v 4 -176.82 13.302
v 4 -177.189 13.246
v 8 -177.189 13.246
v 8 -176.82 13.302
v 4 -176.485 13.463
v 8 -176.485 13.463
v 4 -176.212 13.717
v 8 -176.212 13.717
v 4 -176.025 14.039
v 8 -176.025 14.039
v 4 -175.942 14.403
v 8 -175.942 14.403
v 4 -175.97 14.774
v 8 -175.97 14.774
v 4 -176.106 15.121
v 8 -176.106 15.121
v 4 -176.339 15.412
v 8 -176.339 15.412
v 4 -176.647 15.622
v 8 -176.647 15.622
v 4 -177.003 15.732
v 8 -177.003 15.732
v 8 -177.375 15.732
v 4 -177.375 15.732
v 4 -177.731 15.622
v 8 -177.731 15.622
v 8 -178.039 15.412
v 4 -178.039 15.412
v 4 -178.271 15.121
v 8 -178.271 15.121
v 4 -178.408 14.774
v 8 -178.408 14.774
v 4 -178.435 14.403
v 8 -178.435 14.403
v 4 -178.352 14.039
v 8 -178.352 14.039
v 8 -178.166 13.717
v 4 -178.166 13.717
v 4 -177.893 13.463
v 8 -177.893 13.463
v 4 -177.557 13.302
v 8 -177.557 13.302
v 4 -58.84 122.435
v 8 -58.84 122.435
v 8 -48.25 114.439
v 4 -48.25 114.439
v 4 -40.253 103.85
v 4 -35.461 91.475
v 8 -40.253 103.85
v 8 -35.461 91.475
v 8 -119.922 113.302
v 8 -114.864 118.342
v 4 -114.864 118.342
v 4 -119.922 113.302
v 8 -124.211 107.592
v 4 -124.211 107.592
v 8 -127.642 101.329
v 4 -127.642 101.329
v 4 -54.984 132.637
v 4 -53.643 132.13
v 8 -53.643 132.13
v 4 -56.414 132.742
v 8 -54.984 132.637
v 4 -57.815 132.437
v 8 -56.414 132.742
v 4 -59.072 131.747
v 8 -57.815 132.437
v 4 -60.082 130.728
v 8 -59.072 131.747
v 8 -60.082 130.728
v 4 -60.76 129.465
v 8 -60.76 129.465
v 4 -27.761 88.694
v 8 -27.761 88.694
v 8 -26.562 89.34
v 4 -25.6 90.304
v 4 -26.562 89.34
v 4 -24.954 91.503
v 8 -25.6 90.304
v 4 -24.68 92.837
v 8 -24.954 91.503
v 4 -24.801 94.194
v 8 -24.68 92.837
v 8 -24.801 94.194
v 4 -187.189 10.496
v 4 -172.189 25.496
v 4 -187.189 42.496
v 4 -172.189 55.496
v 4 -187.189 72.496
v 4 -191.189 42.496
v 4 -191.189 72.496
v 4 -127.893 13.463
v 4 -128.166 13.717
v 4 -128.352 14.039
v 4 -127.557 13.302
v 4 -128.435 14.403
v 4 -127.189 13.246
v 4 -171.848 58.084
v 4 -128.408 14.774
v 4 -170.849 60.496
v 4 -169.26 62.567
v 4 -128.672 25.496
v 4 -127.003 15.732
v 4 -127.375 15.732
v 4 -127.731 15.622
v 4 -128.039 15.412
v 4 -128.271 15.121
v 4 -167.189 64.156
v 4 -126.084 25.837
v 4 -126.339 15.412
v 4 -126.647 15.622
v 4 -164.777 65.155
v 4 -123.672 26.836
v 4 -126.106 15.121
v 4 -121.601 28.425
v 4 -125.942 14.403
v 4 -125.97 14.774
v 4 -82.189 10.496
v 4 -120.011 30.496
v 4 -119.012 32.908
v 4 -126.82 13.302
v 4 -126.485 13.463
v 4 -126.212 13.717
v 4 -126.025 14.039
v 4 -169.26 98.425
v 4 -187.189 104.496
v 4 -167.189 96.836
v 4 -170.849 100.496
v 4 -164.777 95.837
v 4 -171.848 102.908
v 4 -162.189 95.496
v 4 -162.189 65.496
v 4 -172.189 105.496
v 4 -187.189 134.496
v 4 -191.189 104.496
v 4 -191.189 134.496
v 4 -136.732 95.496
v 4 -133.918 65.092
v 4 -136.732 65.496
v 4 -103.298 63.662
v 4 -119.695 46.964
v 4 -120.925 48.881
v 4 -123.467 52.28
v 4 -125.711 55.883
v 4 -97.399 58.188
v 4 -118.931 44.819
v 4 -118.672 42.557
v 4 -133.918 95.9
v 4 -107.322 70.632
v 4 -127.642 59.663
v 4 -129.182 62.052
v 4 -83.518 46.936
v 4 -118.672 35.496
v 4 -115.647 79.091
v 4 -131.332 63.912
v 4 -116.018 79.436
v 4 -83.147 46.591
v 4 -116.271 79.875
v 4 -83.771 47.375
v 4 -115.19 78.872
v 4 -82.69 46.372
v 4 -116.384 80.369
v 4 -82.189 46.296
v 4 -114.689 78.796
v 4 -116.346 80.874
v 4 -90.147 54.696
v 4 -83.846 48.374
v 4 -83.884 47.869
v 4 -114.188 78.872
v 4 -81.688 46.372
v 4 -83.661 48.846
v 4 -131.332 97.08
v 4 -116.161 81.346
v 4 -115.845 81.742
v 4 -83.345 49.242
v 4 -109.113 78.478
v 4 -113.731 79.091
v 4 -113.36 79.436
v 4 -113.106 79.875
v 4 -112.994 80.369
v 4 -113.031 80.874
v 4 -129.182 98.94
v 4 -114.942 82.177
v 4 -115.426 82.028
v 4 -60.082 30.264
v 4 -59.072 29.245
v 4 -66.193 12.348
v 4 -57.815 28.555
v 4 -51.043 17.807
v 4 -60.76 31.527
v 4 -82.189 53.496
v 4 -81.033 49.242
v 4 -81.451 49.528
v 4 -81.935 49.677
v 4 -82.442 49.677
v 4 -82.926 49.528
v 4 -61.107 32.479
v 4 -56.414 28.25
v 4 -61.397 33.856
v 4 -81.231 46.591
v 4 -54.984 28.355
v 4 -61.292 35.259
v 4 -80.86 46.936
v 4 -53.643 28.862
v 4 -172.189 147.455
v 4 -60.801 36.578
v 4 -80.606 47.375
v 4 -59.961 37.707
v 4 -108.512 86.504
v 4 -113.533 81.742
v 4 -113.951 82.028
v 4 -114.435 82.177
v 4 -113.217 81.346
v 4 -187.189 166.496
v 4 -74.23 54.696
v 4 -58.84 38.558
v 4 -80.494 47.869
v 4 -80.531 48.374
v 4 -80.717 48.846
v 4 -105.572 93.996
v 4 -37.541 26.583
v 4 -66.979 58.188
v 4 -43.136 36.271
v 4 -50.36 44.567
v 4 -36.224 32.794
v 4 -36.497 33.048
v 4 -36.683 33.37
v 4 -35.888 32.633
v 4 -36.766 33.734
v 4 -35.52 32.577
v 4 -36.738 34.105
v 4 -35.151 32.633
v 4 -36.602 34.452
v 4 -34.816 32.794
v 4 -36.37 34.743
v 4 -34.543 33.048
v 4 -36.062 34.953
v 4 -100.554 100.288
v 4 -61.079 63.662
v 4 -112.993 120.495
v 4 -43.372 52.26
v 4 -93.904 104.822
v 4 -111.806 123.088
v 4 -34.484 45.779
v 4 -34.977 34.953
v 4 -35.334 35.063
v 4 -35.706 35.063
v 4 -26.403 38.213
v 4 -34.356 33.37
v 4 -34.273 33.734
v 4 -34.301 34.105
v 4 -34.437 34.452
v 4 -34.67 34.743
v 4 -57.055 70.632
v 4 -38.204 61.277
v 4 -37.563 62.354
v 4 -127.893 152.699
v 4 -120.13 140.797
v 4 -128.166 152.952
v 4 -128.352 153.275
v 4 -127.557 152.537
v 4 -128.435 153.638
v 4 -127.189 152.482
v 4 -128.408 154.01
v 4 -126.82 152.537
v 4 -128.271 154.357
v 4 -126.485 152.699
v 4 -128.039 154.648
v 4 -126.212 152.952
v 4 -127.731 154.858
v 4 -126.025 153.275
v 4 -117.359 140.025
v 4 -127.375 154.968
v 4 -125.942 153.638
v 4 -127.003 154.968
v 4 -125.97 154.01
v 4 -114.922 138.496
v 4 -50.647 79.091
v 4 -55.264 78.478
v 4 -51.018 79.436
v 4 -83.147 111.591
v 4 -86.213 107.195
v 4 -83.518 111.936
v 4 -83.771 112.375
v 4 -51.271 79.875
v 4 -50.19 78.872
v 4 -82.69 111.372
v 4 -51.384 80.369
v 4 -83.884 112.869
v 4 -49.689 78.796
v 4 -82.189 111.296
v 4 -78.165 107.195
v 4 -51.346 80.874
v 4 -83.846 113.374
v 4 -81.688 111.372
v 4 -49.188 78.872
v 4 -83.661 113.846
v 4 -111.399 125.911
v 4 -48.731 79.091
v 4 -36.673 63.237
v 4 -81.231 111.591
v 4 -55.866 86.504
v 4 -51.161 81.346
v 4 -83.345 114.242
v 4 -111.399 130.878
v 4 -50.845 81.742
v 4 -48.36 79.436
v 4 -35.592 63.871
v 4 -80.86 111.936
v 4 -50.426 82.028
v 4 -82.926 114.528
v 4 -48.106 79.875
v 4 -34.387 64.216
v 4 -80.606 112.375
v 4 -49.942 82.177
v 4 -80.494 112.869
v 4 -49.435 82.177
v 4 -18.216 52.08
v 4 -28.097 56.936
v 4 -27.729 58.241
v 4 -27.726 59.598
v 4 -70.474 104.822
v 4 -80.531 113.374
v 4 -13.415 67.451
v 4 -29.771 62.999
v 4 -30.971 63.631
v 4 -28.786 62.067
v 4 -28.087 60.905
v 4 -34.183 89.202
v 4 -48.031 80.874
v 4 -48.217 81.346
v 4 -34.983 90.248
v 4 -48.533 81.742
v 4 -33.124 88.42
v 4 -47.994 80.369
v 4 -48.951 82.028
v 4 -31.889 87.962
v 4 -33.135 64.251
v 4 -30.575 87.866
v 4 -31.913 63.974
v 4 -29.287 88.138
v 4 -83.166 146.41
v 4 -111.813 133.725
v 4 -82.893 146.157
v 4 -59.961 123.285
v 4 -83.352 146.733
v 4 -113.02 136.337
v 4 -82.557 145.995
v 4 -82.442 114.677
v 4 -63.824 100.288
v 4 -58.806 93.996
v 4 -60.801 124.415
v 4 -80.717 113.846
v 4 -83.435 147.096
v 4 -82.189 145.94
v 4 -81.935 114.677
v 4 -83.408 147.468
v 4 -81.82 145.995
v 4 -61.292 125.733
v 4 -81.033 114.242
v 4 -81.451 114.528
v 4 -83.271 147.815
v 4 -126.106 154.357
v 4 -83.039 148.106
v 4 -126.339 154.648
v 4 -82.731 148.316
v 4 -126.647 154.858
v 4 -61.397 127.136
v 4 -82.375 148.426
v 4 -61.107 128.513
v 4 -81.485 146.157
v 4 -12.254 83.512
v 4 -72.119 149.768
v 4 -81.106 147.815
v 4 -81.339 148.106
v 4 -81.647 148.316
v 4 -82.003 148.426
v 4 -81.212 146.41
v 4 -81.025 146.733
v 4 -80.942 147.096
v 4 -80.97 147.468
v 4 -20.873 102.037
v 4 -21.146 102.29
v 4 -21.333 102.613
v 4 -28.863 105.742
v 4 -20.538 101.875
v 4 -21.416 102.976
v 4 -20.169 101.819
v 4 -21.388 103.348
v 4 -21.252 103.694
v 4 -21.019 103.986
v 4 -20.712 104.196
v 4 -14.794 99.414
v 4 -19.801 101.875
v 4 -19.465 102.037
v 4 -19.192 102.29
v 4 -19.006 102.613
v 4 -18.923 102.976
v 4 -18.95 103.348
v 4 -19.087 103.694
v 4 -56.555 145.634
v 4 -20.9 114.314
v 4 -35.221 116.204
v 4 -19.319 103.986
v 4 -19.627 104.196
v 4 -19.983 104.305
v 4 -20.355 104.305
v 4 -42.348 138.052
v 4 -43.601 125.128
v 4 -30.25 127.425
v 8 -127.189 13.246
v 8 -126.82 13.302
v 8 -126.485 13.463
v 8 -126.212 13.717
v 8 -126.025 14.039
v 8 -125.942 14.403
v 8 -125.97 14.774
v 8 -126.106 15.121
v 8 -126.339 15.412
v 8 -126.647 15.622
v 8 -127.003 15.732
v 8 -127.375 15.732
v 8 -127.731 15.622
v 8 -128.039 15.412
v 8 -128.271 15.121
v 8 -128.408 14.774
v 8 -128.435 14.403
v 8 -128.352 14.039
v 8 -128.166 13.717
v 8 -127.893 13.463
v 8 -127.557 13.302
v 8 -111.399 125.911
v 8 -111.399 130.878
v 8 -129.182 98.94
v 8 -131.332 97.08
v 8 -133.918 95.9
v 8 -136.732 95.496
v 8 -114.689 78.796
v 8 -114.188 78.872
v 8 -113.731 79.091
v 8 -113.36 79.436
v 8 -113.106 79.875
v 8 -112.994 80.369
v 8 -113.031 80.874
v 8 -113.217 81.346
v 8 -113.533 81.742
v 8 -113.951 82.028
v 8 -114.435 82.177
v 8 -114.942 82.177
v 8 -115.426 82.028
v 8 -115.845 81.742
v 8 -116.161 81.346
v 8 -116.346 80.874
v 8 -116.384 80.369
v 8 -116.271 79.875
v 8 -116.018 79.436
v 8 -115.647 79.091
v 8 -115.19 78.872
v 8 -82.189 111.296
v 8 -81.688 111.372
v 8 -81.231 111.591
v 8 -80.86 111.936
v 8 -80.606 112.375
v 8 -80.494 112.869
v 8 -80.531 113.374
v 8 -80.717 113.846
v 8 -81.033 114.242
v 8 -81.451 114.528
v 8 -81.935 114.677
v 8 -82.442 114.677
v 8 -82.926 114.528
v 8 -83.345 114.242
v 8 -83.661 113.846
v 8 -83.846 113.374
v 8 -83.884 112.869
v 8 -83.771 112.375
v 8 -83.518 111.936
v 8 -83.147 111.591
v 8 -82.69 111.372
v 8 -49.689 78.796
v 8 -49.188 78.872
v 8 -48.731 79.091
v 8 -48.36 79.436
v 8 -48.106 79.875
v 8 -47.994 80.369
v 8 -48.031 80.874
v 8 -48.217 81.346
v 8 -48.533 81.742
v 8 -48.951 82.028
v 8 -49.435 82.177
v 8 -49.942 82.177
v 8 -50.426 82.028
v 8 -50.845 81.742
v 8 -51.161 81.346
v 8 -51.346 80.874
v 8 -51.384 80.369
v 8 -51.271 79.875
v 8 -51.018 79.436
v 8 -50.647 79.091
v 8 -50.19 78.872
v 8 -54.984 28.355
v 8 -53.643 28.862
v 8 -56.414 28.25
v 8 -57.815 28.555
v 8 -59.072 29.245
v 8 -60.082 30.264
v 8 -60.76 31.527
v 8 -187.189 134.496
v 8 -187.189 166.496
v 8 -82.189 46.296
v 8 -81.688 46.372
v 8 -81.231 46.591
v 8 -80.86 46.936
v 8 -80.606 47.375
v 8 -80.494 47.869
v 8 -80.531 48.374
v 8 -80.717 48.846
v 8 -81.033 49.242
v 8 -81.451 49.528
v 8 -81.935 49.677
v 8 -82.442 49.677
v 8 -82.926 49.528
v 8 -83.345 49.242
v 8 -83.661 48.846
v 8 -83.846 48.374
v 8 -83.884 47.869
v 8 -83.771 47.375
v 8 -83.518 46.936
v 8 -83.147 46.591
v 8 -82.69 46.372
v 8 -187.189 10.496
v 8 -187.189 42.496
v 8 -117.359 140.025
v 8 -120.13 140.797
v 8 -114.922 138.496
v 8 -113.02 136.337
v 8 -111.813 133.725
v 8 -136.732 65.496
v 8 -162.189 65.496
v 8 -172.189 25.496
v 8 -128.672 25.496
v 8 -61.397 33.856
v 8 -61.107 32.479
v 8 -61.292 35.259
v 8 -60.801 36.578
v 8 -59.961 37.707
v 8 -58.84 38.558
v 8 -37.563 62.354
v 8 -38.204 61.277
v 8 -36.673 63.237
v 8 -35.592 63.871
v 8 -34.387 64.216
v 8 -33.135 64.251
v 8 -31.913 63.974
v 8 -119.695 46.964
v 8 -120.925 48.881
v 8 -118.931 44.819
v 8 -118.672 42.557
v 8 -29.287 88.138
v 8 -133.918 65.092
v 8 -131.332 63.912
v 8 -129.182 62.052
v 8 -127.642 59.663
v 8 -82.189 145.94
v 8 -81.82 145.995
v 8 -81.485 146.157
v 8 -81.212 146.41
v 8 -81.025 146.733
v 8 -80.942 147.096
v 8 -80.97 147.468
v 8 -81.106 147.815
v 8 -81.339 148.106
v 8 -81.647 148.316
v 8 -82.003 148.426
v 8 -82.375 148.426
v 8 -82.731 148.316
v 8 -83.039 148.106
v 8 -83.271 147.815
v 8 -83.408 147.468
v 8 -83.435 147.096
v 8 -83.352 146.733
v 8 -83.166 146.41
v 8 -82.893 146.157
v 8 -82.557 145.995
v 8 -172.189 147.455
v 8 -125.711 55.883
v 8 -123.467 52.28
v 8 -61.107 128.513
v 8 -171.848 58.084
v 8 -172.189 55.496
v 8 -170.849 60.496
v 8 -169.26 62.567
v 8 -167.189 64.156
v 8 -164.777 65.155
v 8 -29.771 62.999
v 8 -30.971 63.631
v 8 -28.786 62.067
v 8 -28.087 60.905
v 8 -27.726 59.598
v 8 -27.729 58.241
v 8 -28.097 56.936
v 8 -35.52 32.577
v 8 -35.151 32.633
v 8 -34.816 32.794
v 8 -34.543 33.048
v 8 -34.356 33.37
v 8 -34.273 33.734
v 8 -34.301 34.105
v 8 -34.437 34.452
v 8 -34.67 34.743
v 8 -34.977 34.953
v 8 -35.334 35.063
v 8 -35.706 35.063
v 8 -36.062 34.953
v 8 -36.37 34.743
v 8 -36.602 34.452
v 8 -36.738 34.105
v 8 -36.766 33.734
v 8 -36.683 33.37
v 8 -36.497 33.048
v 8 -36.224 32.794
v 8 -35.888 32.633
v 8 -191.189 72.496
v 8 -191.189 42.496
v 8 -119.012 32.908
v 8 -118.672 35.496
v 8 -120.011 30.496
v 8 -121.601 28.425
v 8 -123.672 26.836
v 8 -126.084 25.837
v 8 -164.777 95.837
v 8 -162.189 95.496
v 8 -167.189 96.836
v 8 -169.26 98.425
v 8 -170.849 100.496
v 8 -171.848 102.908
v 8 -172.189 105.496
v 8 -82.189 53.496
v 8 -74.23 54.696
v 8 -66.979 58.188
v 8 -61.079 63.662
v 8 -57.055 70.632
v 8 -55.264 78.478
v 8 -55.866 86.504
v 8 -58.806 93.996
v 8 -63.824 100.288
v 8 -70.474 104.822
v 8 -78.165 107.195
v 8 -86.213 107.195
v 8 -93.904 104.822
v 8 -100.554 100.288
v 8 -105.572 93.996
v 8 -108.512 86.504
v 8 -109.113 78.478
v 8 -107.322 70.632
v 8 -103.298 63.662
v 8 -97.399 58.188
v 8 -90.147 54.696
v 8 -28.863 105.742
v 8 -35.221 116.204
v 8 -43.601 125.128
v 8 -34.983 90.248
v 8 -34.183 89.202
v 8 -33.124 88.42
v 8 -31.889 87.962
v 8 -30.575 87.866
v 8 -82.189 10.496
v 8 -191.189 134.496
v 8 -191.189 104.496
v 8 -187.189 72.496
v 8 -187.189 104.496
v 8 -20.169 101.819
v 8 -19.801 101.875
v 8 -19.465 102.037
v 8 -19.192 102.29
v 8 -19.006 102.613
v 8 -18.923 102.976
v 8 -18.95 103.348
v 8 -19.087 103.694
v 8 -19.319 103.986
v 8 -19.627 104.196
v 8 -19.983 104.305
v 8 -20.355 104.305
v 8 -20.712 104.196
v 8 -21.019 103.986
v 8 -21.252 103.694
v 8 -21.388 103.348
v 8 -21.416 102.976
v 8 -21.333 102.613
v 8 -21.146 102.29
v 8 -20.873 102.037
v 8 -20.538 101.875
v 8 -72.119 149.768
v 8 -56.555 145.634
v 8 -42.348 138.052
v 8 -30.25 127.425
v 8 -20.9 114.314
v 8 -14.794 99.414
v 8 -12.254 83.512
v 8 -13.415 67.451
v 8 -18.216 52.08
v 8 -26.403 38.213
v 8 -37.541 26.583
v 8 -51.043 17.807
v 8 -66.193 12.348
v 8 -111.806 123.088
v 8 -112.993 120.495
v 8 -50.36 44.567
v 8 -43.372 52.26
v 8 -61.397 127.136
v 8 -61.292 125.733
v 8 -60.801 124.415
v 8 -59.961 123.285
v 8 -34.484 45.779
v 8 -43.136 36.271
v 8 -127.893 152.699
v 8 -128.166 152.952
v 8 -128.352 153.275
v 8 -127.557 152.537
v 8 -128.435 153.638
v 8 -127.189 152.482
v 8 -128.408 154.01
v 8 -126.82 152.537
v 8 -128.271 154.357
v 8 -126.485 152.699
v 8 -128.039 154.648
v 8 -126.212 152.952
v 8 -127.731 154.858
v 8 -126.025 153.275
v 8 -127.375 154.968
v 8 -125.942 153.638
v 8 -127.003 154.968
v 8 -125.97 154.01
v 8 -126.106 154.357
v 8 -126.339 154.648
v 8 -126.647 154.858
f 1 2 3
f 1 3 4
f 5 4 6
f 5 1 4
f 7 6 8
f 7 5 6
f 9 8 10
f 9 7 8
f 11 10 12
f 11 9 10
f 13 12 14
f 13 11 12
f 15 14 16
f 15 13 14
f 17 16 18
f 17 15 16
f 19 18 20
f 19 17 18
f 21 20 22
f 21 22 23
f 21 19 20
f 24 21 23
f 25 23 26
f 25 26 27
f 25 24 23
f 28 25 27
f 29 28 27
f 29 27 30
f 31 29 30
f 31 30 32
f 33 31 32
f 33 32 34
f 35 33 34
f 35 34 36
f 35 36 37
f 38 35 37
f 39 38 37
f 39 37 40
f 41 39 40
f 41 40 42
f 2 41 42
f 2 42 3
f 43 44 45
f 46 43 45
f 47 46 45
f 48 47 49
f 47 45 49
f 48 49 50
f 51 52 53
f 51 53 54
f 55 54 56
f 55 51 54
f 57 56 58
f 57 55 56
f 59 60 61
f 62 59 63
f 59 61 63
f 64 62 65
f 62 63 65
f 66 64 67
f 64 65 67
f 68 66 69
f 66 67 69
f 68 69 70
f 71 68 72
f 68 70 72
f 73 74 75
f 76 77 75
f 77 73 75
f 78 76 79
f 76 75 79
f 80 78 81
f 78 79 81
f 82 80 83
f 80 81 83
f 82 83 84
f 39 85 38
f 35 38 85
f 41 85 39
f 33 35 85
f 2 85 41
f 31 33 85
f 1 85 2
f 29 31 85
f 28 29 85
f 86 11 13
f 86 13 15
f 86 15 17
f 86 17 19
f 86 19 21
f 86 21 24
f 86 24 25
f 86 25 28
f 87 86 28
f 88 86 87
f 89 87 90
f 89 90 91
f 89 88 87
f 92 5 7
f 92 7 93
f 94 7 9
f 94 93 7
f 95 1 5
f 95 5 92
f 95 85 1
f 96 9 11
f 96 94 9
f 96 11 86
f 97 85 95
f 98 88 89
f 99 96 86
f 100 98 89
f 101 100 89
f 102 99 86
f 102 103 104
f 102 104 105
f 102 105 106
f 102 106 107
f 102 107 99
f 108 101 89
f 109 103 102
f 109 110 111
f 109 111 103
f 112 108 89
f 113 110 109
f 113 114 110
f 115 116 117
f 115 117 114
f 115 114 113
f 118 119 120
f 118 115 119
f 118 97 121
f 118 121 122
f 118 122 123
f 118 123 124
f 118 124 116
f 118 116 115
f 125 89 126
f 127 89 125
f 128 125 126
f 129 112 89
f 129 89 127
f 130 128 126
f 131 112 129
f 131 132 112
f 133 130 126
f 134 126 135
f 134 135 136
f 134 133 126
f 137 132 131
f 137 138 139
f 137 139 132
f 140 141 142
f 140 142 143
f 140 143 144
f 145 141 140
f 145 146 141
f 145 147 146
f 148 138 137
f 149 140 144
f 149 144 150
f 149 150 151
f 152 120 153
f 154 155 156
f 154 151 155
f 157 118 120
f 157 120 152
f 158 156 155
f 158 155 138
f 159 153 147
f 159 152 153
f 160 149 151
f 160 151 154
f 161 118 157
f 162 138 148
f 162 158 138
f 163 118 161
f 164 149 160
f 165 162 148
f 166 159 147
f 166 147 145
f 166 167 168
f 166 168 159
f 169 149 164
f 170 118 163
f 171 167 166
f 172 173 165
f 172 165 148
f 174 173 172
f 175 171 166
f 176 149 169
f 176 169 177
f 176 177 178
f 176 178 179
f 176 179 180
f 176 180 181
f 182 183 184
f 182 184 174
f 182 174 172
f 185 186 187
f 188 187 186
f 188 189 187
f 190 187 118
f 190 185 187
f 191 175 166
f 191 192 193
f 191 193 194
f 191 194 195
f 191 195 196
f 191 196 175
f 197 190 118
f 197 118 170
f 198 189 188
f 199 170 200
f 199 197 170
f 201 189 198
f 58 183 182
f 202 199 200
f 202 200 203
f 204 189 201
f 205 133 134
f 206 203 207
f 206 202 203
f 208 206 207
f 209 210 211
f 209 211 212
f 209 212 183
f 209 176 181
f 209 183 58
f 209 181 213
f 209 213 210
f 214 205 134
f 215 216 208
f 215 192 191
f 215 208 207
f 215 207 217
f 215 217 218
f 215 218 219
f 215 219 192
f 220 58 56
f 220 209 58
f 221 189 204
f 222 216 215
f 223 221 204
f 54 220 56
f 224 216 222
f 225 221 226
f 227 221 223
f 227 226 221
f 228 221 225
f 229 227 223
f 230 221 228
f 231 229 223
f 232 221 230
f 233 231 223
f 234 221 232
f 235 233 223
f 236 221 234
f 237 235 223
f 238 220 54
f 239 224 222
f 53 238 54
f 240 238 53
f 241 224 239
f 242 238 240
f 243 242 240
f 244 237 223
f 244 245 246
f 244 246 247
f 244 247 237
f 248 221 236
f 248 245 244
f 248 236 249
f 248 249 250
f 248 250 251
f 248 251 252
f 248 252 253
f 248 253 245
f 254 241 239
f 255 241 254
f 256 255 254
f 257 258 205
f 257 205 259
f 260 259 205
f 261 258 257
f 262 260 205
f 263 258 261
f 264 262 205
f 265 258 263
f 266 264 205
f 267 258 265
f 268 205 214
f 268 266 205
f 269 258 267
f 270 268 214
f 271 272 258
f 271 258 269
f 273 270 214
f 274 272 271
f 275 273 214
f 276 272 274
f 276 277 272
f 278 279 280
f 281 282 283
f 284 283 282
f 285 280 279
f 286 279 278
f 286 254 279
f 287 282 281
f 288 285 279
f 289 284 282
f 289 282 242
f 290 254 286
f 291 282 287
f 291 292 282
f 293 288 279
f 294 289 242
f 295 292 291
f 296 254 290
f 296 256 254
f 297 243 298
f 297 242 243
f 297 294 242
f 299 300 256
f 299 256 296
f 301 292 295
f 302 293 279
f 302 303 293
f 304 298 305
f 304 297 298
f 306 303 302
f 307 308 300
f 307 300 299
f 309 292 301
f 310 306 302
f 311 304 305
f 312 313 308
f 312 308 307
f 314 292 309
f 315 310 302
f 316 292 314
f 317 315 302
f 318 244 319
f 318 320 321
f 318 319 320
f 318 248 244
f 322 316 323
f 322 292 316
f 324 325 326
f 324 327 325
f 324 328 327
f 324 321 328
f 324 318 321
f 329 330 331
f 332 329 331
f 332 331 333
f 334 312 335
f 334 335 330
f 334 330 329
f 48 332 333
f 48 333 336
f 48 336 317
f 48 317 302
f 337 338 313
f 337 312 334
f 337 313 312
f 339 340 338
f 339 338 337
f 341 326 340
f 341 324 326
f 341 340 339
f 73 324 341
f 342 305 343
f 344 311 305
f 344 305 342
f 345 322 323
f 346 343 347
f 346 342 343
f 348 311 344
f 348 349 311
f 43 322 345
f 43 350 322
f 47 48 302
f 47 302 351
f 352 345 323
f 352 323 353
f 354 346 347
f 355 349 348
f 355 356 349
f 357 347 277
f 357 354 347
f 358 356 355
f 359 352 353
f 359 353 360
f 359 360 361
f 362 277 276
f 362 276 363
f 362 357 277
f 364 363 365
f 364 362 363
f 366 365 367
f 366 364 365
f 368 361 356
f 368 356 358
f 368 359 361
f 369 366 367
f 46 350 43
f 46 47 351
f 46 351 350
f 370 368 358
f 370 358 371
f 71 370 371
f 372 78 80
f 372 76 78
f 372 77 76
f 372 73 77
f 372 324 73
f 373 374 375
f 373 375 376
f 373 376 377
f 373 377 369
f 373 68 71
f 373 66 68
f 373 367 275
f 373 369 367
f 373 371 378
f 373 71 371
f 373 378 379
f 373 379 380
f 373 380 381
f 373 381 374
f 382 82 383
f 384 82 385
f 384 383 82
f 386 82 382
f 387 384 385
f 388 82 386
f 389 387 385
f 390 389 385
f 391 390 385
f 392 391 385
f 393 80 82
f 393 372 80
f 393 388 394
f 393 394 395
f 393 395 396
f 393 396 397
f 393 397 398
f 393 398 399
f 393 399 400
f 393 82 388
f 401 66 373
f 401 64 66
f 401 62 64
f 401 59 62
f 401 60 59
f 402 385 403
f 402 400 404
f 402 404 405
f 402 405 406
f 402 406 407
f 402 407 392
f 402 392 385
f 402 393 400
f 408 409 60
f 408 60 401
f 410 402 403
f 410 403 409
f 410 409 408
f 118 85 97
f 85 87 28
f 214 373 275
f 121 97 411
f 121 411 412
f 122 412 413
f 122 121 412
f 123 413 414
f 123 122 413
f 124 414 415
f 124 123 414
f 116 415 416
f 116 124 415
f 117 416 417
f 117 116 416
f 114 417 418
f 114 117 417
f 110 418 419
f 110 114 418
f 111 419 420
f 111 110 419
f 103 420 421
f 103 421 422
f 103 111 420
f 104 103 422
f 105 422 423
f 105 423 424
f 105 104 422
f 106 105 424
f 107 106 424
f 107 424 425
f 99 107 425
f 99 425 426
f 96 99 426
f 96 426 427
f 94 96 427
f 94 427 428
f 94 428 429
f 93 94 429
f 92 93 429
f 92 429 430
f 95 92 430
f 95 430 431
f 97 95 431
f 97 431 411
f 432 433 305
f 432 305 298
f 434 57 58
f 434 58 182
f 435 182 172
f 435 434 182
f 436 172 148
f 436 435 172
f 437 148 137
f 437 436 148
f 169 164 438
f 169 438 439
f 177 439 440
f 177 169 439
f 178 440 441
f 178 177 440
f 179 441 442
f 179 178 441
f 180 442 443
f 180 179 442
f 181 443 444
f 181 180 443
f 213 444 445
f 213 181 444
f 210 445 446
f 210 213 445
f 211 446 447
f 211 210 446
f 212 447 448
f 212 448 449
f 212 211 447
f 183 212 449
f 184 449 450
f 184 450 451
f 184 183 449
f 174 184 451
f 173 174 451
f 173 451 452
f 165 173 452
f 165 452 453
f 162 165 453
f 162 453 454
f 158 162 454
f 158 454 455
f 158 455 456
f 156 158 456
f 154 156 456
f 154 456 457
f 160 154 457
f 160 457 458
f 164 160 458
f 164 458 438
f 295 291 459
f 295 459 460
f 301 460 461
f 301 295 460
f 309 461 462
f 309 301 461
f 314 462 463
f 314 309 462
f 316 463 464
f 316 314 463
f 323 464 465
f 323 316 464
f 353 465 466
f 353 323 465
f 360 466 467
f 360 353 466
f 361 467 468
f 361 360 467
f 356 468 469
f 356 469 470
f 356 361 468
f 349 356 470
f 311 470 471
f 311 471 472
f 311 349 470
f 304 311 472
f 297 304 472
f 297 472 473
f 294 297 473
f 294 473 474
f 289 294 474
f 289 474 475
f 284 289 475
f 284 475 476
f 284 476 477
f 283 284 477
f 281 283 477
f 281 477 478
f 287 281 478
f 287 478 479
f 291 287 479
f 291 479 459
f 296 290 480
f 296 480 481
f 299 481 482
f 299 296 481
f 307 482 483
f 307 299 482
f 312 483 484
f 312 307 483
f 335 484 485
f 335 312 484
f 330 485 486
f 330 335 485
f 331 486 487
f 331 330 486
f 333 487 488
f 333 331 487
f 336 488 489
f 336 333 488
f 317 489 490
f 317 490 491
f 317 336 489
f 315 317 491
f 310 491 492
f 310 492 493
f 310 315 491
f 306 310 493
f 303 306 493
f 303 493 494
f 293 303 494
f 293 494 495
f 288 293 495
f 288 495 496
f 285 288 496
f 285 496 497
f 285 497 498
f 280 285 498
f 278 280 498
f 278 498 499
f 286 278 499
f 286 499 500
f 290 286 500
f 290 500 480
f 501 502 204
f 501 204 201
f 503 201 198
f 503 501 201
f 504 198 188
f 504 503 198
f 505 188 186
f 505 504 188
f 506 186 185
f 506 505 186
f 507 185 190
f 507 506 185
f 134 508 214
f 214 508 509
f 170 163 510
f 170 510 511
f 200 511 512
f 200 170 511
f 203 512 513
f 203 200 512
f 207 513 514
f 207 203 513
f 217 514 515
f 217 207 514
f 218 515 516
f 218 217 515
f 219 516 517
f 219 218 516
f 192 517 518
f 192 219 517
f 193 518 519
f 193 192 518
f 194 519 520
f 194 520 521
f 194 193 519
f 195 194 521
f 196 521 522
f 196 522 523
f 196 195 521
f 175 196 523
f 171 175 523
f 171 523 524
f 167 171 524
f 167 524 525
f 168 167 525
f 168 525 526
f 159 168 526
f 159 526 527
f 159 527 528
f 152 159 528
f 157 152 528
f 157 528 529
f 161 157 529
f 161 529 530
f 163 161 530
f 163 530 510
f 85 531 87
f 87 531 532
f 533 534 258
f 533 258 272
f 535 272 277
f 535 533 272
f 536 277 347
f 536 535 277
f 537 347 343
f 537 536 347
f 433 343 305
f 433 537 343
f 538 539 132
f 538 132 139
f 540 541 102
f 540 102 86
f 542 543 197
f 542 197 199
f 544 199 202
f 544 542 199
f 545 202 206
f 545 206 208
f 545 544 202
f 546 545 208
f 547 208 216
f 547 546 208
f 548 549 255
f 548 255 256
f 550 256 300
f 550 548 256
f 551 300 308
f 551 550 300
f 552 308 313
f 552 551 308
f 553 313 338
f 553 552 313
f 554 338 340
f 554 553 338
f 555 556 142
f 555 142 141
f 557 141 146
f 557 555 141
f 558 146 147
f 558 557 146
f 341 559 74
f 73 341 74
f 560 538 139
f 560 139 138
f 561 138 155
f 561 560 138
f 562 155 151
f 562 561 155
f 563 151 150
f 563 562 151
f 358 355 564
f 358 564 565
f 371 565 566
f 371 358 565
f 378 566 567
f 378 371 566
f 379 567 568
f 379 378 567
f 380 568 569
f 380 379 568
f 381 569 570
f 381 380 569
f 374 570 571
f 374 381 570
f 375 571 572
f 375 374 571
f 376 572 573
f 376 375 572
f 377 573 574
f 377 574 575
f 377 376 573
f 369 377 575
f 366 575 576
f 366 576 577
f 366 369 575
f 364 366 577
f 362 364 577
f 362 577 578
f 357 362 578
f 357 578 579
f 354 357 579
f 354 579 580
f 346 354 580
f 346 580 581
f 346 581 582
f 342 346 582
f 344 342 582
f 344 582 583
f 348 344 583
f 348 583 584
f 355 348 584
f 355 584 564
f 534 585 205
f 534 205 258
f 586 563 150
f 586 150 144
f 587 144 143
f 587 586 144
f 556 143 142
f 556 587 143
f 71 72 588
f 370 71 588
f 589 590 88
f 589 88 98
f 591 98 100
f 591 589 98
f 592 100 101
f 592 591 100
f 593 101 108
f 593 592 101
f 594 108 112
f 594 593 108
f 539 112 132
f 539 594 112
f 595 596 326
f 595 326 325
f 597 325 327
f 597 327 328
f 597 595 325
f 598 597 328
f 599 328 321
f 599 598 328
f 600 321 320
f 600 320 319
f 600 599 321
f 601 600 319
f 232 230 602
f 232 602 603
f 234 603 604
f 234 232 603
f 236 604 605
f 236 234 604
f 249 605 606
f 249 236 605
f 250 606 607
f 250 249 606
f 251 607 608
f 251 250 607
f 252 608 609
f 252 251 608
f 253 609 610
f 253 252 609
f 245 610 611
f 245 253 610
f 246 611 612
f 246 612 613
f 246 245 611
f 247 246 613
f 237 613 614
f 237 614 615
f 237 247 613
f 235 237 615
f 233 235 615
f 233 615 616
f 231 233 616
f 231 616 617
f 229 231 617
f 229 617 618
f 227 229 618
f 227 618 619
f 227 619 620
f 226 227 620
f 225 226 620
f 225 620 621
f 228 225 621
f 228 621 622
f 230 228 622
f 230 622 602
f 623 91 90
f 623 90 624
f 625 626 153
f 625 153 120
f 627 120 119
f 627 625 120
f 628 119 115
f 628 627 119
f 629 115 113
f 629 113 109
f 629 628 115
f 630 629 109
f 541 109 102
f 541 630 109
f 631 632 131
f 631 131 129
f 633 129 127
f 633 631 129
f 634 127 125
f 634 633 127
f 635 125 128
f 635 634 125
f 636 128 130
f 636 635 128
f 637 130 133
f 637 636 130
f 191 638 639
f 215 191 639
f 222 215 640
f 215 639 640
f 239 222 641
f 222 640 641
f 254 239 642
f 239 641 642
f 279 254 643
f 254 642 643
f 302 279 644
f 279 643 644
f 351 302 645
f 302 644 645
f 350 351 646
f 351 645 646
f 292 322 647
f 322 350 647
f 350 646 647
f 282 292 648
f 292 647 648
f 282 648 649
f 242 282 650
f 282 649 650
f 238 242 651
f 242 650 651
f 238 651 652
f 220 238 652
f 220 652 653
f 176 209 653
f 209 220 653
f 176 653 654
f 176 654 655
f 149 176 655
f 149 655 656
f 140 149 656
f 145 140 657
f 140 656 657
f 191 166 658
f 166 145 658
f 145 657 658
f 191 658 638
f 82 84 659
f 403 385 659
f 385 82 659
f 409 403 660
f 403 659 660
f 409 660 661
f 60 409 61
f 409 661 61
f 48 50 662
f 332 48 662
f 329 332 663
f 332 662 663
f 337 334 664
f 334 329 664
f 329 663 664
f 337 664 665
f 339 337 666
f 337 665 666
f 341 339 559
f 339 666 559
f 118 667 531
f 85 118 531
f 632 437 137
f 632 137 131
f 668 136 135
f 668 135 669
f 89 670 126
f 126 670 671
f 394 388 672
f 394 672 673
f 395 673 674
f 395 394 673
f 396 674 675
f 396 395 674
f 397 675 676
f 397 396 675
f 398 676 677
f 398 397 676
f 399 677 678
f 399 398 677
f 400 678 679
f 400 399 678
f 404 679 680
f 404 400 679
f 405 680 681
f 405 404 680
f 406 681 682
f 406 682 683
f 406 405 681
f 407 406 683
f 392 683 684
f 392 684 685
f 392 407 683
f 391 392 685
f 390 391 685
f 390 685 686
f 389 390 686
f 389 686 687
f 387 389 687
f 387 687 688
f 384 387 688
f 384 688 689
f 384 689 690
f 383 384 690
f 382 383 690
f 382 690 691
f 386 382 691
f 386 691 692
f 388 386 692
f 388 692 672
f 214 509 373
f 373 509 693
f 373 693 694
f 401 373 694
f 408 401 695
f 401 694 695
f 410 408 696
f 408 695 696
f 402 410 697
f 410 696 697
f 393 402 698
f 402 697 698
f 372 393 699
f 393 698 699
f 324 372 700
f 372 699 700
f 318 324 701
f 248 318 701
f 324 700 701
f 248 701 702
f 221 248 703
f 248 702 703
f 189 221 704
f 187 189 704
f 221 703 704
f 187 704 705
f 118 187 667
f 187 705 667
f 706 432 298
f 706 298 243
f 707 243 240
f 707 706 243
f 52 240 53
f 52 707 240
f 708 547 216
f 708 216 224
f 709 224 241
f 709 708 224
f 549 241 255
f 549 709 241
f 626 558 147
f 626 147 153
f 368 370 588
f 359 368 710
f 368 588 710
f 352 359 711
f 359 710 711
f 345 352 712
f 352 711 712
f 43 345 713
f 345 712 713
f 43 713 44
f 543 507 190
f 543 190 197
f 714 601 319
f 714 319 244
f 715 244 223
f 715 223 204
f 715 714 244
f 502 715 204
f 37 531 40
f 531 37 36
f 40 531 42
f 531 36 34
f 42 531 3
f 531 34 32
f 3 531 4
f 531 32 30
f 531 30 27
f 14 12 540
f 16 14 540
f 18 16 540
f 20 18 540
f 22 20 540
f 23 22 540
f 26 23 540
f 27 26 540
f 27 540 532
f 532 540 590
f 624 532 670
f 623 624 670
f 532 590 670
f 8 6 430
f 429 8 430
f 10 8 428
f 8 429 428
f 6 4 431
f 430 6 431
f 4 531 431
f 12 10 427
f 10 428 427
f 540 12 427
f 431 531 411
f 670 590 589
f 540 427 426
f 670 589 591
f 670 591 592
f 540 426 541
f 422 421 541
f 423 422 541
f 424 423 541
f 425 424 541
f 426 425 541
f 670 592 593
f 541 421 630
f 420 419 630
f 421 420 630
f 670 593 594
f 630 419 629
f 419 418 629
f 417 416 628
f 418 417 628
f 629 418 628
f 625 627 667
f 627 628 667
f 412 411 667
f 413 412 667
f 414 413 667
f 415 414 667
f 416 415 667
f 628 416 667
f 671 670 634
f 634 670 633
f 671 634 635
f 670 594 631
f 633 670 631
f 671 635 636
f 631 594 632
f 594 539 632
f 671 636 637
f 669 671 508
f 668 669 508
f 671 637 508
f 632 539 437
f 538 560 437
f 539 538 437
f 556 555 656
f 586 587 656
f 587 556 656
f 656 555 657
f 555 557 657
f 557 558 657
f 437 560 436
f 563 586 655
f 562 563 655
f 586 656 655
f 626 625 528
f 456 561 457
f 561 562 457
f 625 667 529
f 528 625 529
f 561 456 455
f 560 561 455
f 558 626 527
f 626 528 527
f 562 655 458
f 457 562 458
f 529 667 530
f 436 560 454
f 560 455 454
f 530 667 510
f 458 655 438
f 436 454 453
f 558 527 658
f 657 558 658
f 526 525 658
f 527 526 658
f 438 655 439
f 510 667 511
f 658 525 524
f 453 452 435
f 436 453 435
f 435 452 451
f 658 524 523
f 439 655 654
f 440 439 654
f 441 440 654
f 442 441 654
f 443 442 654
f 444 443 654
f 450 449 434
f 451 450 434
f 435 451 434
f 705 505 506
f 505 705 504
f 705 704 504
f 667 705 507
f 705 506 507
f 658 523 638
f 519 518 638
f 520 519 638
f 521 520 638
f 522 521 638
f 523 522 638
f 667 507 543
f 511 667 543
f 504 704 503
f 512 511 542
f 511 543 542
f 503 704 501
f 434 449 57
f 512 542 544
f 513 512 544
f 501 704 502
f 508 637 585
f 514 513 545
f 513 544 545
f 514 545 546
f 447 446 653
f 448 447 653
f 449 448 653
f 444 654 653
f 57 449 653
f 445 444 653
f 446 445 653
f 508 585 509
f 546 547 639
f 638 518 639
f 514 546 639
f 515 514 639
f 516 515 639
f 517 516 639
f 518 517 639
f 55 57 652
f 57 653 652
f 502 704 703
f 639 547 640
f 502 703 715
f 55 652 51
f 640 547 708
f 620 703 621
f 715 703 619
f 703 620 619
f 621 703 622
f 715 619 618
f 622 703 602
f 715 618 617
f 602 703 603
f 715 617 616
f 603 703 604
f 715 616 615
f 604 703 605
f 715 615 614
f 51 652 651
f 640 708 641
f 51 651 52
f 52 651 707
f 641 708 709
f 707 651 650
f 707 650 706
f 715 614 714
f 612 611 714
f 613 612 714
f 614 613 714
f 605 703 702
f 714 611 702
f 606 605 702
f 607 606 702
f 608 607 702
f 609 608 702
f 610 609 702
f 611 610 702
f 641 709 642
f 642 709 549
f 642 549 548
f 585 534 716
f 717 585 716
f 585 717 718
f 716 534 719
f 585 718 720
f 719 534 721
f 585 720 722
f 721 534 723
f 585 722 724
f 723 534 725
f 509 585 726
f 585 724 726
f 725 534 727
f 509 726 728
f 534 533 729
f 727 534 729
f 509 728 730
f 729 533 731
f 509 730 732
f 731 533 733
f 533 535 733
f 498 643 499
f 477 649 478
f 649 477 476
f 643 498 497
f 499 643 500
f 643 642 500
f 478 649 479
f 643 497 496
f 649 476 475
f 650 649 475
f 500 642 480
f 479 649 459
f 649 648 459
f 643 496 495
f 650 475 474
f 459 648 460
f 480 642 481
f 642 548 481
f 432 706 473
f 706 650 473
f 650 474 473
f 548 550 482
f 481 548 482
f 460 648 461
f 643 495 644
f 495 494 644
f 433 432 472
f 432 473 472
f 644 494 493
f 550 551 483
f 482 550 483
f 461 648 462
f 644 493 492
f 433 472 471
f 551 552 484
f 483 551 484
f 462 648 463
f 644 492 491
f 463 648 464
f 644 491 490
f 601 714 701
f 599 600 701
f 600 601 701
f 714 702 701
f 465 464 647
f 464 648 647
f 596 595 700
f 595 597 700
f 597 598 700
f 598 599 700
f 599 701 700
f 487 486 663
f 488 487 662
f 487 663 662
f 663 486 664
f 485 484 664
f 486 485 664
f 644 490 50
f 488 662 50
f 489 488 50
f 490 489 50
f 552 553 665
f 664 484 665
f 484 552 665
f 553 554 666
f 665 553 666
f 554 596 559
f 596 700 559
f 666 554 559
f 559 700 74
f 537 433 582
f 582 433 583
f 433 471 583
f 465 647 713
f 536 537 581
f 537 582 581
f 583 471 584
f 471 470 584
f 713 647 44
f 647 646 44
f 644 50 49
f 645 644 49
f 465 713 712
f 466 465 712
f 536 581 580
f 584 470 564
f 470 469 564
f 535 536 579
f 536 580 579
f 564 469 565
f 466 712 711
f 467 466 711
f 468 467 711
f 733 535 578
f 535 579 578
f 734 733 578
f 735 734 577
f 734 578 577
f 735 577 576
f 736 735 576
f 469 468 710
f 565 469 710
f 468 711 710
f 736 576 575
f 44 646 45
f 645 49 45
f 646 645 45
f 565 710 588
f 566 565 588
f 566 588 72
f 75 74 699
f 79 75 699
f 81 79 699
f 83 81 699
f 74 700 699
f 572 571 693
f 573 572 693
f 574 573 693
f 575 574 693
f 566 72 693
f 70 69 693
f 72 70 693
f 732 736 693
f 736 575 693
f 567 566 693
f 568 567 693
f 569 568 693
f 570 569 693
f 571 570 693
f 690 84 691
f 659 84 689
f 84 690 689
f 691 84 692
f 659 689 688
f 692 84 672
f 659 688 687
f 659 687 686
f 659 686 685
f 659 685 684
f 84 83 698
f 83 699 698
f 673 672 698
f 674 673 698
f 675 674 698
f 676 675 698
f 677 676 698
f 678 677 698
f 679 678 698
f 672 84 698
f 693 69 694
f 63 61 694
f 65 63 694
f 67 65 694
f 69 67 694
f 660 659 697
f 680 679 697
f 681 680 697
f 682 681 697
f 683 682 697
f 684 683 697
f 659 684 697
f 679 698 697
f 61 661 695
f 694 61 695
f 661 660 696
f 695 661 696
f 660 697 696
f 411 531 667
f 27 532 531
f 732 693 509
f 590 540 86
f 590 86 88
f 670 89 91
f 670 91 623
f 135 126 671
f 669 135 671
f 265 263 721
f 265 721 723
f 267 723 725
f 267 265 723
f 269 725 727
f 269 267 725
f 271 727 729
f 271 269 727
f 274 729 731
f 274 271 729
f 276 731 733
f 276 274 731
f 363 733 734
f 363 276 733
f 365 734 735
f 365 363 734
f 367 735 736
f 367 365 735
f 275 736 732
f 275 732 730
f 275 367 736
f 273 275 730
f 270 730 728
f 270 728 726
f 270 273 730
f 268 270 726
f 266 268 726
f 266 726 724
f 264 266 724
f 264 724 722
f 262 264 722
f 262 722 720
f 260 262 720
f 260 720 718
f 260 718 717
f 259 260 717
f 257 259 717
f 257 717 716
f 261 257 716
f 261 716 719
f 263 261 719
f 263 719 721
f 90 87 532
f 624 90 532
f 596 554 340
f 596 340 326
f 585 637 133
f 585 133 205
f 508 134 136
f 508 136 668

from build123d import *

# Parameters (mm, degrees)
AUFSATZ_LINEAR_AUSTRAGEN3_DEPTH      = 4
SCHNITT_LINEAR_AUSTRAGEN5_DEPTH      = 9.5
SCHNITT_LINEAR_AUSTRAGEN5_DEPTH_BACK = 9.5
SKIZZE2_24_R                         = 27
DURCHGANGSLOCH_F_R_M31_D             = 3.4
DURCHGANGSLOCH_F_R_M31_DEPTH         = 20
DURCHGANGSLOCH_F_R_M31_TIP           = 1.021463052
M3_GEWINDEBOHRUNG1_D                 = 2.5
M3_GEWINDEBOHRUNG1_DEPTH             = 8.5
M3_GEWINDEBOHRUNG1_TIP               = 0.751075774
SCHNITT_LINEAR_AUSTRAGEN6_DEPTH      = 11.5
SCHNITT_LINEAR_AUSTRAGEN7_DEPTH      = 251.552631004
SKIZZE13_W                           = 4
SKIZZE13_H                           = 30
AUFSATZ_LINEAR_AUSTRAGEN4_DEPTH      = 4


with BuildPart() as part:
    # Skizze2 → Aufsatz-Linear austragen3 (new body)
    with BuildSketch(Plane(origin=(0, 0, 0), x_dir=(0, 0, -1), z_dir=(1, 0, 0))):
        with BuildLine():
            Line((-10.496092502, -82.188867417), (-10.496092502, -187.188867417))
            Line((-10.496092502, -187.188867417), (-166.496092502, -187.188867417))
            Line((-166.496092502, -187.188867417), (-149.76794454, -72.118588605))
            ThreePointArc((-149.76794454, -72.118588605), (-75.447807774, -12.371141721), (-10.496092502, -82.188867417))
        make_face()
    extrude(amount=AUFSATZ_LINEAR_AUSTRAGEN3_DEPTH)

    # Skizze2<24> → Schnitt-Linear austragen5 (cut, two sides: drawn at the far end of the back side and taken through both)
    with BuildSketch(Plane(origin=(0, 0, 0), x_dir=(0, 0, -1), z_dir=(1, 0, 0)).offset(-SCHNITT_LINEAR_AUSTRAGEN5_DEPTH_BACK)):
        with Locations((-80.496092502, -82.188867417)):
            Circle(SKIZZE2_24_R)
    extrude(amount=SCHNITT_LINEAR_AUSTRAGEN5_DEPTH + SCHNITT_LINEAR_AUSTRAGEN5_DEPTH_BACK, mode=Mode.SUBTRACT)

    # Durchgangsloch für M31
    with Locations(Plane.ZY):
        with Locations((47.996092502, -82.188867417), (80.496092502, -49.688867417), (112.996092502, -82.188867417), (80.496092502, -114.688867417)):
            Hole(DURCHGANGSLOCH_F_R_M31_D / 2, depth=DURCHGANGSLOCH_F_R_M31_DEPTH)
            with Locations((0, 0, -(DURCHGANGSLOCH_F_R_M31_DEPTH + DURCHGANGSLOCH_F_R_M31_TIP / 2))):  # 118° drill point
                Cone(0, DURCHGANGSLOCH_F_R_M31_D / 2, DURCHGANGSLOCH_F_R_M31_TIP, mode=Mode.SUBTRACT)

    # M3 Gewindebohrung1
    with Locations(Plane.ZY):
        with Locations((33.827044944, -35.519819858), (103.069421962, -20.169154445), (14.496092502, -127.188867417), (14.496092502, -177.188867417), (147.189848539, -82.188867417), (153.731647743, -127.188867417)):
            Hole(M3_GEWINDEBOHRUNG1_D / 2, depth=M3_GEWINDEBOHRUNG1_DEPTH)
            with Locations((0, 0, -(M3_GEWINDEBOHRUNG1_DEPTH + M3_GEWINDEBOHRUNG1_TIP / 2))):  # 118° drill point
                Cone(0, M3_GEWINDEBOHRUNG1_D / 2, M3_GEWINDEBOHRUNG1_TIP, mode=Mode.SUBTRACT)

    # Skizze2<28> → Schnitt-Linear austragen6 (cut)
    with BuildSketch(Plane(origin=(0, 0, 0), x_dir=(0, 0, -1), z_dir=(1, 0, 0))):
        with BuildLine():
            Line((-25.496092502, -172.188916155), (-55.496092502, -172.188916155))
            ThreePointArc((-55.496092502, -172.188916155), (-62.567160314, -169.259983967), (-65.496092502, -162.188916155))
            Line((-65.496092502, -162.188916155), (-65.496092502, -146.461723273))
            Line((-65.496092502, -146.461723273), (-65.496092502, -136.73242799))
            ThreePointArc((-65.496092502, -136.73242799), (-63.912346618, -131.331810741), (-59.662759169, -127.641834561))
            ThreePointArc((-59.662759169, -127.641834561), (-54.057449416, -124.627035988), (-48.880535655, -120.924594661))
            ThreePointArc((-48.880535655, -120.924594661), (-45.913653233, -119.251775819), (-42.557424285, -118.67174011))
            Line((-42.557424285, -118.67174011), (-35.496092502, -118.67174011))
            ThreePointArc((-35.496092502, -118.67174011), (-28.425024691, -121.600672299), (-25.496092502, -128.67174011))
            Line((-25.496092502, -128.67174011), (-25.496092502, -172.188916155))
        make_face()
        with BuildLine():
            Line((-130.877768415, -111.399148996), (-125.911440332, -111.399148996))
            ThreePointArc((-125.911440332, -111.399148996), (-121.749137442, -112.3065567), (-118.342215694, -114.864102066))
            ThreePointArc((-118.342215694, -114.864102066), (-110.523367877, -122.168396348), (-101.329425836, -127.641834561))
            ThreePointArc((-101.329425836, -127.641834561), (-97.079838387, -131.331810741), (-95.496092502, -136.73242799))
            Line((-95.496092502, -136.73242799), (-95.496092502, -146.461723273))
            Line((-95.496092502, -146.461723273), (-95.496092502, -162.188916155))
            ThreePointArc((-95.496092502, -162.188916155), (-98.425024691, -169.259983967), (-105.496092502, -172.188916155))
            Line((-105.496092502, -172.188916155), (-135.495711073, -172.188916155))
            Line((-135.495711073, -172.188916155), (-147.455367056, -172.188916155))
            Line((-147.455367056, -172.188916155), (-140.79696332, -120.130459738))
            ThreePointArc((-140.79696332, -120.130459738), (-137.485079041, -113.892921828), (-130.877768415, -111.399148996))
        make_face()
    extrude(amount=SCHNITT_LINEAR_AUSTRAGEN6_DEPTH, mode=Mode.SUBTRACT)

    # Skizze12 → Schnitt-Linear austragen7 (cut, through all)
    with BuildSketch(Plane(origin=(0, 0, 0), x_dir=(0, -1, 0), z_dir=(-1, 0, 0))):
        with BuildLine():
            Line((31.912537744, 63.973777934), (30.971018966, 63.631093123))
            ThreePointArc((30.971018966, 63.631093123), (28.08654575, 60.904910522), (28.097068966, 56.936013123))
            ThreePointArc((28.097068966, 56.936013123), (38.550531474, 40.788465575), (53.642597032, 28.861700406))
            ThreePointArc((53.642597032, 28.861700406), (57.815417493, 28.555111356), (60.760235592, 31.52739563))
            Line((60.760235592, 31.52739563), (61.10653899, 32.478856395))
            ThreePointArc((61.10653899, 32.478856395), (61.093057729, 35.935652601), (58.840226031, 38.55755479))
            ThreePointArc((58.840226031, 38.55755479), (46.6574065, 48.223576562), (38.204358174, 61.277274988))
            ThreePointArc((38.204358174, 61.277274988), (35.592240185, 63.871037738), (31.912537744, 63.973777934))
        make_face()
        with BuildLine():
            Line((29.286912013, 88.138295897), (27.761021392, 88.693674664))
            ThreePointArc((27.761021392, 88.693674664), (25.233242691, 90.879922217), (24.8009776, 94.193906286))
            ThreePointArc((24.8009776, 94.193906286), (35.221155466, 116.203711215), (53.642597032, 132.130484599))
            ThreePointArc((53.642597032, 132.130484599), (57.815417493, 132.437073649), (60.760235592, 129.464789375))
            Line((60.760235592, 129.464789375), (61.10653899, 128.51332861))
            ThreePointArc((61.10653899, 128.51332861), (61.093057729, 125.056532404), (58.840226031, 122.434630215))
            ThreePointArc((58.840226031, 122.434630215), (43.883689457, 109.422090178), (35.461380891, 91.475254721))
            ThreePointArc((35.461380891, 91.475254721), (33.123794278, 88.419680828), (29.286912013, 88.138295897))
        make_face()
    extrude(amount=-SCHNITT_LINEAR_AUSTRAGEN7_DEPTH, mode=Mode.SUBTRACT)


with BuildPart() as body_2:
    # Spiegeln1: mirrored copy
    add(part.part.mirror(Plane(origin=(4, -82.188867417, 80.496092502), x_dir=(0, 0, 1), z_dir=(1, 0, 0))))

    # Skizze13 → Aufsatz-Linear austragen4 (add)
    with BuildSketch(Plane.XZ.offset(187.188867417)):
        with Locations((6, 57.496092502)):
            Rectangle(SKIZZE13_W, SKIZZE13_H)
        with Locations((6, 119.496092502)):
            Rectangle(SKIZZE13_W, SKIZZE13_H)
    extrude(amount=AUFSATZ_LINEAR_AUSTRAGEN4_DEPTH)


solid = body_2.part
